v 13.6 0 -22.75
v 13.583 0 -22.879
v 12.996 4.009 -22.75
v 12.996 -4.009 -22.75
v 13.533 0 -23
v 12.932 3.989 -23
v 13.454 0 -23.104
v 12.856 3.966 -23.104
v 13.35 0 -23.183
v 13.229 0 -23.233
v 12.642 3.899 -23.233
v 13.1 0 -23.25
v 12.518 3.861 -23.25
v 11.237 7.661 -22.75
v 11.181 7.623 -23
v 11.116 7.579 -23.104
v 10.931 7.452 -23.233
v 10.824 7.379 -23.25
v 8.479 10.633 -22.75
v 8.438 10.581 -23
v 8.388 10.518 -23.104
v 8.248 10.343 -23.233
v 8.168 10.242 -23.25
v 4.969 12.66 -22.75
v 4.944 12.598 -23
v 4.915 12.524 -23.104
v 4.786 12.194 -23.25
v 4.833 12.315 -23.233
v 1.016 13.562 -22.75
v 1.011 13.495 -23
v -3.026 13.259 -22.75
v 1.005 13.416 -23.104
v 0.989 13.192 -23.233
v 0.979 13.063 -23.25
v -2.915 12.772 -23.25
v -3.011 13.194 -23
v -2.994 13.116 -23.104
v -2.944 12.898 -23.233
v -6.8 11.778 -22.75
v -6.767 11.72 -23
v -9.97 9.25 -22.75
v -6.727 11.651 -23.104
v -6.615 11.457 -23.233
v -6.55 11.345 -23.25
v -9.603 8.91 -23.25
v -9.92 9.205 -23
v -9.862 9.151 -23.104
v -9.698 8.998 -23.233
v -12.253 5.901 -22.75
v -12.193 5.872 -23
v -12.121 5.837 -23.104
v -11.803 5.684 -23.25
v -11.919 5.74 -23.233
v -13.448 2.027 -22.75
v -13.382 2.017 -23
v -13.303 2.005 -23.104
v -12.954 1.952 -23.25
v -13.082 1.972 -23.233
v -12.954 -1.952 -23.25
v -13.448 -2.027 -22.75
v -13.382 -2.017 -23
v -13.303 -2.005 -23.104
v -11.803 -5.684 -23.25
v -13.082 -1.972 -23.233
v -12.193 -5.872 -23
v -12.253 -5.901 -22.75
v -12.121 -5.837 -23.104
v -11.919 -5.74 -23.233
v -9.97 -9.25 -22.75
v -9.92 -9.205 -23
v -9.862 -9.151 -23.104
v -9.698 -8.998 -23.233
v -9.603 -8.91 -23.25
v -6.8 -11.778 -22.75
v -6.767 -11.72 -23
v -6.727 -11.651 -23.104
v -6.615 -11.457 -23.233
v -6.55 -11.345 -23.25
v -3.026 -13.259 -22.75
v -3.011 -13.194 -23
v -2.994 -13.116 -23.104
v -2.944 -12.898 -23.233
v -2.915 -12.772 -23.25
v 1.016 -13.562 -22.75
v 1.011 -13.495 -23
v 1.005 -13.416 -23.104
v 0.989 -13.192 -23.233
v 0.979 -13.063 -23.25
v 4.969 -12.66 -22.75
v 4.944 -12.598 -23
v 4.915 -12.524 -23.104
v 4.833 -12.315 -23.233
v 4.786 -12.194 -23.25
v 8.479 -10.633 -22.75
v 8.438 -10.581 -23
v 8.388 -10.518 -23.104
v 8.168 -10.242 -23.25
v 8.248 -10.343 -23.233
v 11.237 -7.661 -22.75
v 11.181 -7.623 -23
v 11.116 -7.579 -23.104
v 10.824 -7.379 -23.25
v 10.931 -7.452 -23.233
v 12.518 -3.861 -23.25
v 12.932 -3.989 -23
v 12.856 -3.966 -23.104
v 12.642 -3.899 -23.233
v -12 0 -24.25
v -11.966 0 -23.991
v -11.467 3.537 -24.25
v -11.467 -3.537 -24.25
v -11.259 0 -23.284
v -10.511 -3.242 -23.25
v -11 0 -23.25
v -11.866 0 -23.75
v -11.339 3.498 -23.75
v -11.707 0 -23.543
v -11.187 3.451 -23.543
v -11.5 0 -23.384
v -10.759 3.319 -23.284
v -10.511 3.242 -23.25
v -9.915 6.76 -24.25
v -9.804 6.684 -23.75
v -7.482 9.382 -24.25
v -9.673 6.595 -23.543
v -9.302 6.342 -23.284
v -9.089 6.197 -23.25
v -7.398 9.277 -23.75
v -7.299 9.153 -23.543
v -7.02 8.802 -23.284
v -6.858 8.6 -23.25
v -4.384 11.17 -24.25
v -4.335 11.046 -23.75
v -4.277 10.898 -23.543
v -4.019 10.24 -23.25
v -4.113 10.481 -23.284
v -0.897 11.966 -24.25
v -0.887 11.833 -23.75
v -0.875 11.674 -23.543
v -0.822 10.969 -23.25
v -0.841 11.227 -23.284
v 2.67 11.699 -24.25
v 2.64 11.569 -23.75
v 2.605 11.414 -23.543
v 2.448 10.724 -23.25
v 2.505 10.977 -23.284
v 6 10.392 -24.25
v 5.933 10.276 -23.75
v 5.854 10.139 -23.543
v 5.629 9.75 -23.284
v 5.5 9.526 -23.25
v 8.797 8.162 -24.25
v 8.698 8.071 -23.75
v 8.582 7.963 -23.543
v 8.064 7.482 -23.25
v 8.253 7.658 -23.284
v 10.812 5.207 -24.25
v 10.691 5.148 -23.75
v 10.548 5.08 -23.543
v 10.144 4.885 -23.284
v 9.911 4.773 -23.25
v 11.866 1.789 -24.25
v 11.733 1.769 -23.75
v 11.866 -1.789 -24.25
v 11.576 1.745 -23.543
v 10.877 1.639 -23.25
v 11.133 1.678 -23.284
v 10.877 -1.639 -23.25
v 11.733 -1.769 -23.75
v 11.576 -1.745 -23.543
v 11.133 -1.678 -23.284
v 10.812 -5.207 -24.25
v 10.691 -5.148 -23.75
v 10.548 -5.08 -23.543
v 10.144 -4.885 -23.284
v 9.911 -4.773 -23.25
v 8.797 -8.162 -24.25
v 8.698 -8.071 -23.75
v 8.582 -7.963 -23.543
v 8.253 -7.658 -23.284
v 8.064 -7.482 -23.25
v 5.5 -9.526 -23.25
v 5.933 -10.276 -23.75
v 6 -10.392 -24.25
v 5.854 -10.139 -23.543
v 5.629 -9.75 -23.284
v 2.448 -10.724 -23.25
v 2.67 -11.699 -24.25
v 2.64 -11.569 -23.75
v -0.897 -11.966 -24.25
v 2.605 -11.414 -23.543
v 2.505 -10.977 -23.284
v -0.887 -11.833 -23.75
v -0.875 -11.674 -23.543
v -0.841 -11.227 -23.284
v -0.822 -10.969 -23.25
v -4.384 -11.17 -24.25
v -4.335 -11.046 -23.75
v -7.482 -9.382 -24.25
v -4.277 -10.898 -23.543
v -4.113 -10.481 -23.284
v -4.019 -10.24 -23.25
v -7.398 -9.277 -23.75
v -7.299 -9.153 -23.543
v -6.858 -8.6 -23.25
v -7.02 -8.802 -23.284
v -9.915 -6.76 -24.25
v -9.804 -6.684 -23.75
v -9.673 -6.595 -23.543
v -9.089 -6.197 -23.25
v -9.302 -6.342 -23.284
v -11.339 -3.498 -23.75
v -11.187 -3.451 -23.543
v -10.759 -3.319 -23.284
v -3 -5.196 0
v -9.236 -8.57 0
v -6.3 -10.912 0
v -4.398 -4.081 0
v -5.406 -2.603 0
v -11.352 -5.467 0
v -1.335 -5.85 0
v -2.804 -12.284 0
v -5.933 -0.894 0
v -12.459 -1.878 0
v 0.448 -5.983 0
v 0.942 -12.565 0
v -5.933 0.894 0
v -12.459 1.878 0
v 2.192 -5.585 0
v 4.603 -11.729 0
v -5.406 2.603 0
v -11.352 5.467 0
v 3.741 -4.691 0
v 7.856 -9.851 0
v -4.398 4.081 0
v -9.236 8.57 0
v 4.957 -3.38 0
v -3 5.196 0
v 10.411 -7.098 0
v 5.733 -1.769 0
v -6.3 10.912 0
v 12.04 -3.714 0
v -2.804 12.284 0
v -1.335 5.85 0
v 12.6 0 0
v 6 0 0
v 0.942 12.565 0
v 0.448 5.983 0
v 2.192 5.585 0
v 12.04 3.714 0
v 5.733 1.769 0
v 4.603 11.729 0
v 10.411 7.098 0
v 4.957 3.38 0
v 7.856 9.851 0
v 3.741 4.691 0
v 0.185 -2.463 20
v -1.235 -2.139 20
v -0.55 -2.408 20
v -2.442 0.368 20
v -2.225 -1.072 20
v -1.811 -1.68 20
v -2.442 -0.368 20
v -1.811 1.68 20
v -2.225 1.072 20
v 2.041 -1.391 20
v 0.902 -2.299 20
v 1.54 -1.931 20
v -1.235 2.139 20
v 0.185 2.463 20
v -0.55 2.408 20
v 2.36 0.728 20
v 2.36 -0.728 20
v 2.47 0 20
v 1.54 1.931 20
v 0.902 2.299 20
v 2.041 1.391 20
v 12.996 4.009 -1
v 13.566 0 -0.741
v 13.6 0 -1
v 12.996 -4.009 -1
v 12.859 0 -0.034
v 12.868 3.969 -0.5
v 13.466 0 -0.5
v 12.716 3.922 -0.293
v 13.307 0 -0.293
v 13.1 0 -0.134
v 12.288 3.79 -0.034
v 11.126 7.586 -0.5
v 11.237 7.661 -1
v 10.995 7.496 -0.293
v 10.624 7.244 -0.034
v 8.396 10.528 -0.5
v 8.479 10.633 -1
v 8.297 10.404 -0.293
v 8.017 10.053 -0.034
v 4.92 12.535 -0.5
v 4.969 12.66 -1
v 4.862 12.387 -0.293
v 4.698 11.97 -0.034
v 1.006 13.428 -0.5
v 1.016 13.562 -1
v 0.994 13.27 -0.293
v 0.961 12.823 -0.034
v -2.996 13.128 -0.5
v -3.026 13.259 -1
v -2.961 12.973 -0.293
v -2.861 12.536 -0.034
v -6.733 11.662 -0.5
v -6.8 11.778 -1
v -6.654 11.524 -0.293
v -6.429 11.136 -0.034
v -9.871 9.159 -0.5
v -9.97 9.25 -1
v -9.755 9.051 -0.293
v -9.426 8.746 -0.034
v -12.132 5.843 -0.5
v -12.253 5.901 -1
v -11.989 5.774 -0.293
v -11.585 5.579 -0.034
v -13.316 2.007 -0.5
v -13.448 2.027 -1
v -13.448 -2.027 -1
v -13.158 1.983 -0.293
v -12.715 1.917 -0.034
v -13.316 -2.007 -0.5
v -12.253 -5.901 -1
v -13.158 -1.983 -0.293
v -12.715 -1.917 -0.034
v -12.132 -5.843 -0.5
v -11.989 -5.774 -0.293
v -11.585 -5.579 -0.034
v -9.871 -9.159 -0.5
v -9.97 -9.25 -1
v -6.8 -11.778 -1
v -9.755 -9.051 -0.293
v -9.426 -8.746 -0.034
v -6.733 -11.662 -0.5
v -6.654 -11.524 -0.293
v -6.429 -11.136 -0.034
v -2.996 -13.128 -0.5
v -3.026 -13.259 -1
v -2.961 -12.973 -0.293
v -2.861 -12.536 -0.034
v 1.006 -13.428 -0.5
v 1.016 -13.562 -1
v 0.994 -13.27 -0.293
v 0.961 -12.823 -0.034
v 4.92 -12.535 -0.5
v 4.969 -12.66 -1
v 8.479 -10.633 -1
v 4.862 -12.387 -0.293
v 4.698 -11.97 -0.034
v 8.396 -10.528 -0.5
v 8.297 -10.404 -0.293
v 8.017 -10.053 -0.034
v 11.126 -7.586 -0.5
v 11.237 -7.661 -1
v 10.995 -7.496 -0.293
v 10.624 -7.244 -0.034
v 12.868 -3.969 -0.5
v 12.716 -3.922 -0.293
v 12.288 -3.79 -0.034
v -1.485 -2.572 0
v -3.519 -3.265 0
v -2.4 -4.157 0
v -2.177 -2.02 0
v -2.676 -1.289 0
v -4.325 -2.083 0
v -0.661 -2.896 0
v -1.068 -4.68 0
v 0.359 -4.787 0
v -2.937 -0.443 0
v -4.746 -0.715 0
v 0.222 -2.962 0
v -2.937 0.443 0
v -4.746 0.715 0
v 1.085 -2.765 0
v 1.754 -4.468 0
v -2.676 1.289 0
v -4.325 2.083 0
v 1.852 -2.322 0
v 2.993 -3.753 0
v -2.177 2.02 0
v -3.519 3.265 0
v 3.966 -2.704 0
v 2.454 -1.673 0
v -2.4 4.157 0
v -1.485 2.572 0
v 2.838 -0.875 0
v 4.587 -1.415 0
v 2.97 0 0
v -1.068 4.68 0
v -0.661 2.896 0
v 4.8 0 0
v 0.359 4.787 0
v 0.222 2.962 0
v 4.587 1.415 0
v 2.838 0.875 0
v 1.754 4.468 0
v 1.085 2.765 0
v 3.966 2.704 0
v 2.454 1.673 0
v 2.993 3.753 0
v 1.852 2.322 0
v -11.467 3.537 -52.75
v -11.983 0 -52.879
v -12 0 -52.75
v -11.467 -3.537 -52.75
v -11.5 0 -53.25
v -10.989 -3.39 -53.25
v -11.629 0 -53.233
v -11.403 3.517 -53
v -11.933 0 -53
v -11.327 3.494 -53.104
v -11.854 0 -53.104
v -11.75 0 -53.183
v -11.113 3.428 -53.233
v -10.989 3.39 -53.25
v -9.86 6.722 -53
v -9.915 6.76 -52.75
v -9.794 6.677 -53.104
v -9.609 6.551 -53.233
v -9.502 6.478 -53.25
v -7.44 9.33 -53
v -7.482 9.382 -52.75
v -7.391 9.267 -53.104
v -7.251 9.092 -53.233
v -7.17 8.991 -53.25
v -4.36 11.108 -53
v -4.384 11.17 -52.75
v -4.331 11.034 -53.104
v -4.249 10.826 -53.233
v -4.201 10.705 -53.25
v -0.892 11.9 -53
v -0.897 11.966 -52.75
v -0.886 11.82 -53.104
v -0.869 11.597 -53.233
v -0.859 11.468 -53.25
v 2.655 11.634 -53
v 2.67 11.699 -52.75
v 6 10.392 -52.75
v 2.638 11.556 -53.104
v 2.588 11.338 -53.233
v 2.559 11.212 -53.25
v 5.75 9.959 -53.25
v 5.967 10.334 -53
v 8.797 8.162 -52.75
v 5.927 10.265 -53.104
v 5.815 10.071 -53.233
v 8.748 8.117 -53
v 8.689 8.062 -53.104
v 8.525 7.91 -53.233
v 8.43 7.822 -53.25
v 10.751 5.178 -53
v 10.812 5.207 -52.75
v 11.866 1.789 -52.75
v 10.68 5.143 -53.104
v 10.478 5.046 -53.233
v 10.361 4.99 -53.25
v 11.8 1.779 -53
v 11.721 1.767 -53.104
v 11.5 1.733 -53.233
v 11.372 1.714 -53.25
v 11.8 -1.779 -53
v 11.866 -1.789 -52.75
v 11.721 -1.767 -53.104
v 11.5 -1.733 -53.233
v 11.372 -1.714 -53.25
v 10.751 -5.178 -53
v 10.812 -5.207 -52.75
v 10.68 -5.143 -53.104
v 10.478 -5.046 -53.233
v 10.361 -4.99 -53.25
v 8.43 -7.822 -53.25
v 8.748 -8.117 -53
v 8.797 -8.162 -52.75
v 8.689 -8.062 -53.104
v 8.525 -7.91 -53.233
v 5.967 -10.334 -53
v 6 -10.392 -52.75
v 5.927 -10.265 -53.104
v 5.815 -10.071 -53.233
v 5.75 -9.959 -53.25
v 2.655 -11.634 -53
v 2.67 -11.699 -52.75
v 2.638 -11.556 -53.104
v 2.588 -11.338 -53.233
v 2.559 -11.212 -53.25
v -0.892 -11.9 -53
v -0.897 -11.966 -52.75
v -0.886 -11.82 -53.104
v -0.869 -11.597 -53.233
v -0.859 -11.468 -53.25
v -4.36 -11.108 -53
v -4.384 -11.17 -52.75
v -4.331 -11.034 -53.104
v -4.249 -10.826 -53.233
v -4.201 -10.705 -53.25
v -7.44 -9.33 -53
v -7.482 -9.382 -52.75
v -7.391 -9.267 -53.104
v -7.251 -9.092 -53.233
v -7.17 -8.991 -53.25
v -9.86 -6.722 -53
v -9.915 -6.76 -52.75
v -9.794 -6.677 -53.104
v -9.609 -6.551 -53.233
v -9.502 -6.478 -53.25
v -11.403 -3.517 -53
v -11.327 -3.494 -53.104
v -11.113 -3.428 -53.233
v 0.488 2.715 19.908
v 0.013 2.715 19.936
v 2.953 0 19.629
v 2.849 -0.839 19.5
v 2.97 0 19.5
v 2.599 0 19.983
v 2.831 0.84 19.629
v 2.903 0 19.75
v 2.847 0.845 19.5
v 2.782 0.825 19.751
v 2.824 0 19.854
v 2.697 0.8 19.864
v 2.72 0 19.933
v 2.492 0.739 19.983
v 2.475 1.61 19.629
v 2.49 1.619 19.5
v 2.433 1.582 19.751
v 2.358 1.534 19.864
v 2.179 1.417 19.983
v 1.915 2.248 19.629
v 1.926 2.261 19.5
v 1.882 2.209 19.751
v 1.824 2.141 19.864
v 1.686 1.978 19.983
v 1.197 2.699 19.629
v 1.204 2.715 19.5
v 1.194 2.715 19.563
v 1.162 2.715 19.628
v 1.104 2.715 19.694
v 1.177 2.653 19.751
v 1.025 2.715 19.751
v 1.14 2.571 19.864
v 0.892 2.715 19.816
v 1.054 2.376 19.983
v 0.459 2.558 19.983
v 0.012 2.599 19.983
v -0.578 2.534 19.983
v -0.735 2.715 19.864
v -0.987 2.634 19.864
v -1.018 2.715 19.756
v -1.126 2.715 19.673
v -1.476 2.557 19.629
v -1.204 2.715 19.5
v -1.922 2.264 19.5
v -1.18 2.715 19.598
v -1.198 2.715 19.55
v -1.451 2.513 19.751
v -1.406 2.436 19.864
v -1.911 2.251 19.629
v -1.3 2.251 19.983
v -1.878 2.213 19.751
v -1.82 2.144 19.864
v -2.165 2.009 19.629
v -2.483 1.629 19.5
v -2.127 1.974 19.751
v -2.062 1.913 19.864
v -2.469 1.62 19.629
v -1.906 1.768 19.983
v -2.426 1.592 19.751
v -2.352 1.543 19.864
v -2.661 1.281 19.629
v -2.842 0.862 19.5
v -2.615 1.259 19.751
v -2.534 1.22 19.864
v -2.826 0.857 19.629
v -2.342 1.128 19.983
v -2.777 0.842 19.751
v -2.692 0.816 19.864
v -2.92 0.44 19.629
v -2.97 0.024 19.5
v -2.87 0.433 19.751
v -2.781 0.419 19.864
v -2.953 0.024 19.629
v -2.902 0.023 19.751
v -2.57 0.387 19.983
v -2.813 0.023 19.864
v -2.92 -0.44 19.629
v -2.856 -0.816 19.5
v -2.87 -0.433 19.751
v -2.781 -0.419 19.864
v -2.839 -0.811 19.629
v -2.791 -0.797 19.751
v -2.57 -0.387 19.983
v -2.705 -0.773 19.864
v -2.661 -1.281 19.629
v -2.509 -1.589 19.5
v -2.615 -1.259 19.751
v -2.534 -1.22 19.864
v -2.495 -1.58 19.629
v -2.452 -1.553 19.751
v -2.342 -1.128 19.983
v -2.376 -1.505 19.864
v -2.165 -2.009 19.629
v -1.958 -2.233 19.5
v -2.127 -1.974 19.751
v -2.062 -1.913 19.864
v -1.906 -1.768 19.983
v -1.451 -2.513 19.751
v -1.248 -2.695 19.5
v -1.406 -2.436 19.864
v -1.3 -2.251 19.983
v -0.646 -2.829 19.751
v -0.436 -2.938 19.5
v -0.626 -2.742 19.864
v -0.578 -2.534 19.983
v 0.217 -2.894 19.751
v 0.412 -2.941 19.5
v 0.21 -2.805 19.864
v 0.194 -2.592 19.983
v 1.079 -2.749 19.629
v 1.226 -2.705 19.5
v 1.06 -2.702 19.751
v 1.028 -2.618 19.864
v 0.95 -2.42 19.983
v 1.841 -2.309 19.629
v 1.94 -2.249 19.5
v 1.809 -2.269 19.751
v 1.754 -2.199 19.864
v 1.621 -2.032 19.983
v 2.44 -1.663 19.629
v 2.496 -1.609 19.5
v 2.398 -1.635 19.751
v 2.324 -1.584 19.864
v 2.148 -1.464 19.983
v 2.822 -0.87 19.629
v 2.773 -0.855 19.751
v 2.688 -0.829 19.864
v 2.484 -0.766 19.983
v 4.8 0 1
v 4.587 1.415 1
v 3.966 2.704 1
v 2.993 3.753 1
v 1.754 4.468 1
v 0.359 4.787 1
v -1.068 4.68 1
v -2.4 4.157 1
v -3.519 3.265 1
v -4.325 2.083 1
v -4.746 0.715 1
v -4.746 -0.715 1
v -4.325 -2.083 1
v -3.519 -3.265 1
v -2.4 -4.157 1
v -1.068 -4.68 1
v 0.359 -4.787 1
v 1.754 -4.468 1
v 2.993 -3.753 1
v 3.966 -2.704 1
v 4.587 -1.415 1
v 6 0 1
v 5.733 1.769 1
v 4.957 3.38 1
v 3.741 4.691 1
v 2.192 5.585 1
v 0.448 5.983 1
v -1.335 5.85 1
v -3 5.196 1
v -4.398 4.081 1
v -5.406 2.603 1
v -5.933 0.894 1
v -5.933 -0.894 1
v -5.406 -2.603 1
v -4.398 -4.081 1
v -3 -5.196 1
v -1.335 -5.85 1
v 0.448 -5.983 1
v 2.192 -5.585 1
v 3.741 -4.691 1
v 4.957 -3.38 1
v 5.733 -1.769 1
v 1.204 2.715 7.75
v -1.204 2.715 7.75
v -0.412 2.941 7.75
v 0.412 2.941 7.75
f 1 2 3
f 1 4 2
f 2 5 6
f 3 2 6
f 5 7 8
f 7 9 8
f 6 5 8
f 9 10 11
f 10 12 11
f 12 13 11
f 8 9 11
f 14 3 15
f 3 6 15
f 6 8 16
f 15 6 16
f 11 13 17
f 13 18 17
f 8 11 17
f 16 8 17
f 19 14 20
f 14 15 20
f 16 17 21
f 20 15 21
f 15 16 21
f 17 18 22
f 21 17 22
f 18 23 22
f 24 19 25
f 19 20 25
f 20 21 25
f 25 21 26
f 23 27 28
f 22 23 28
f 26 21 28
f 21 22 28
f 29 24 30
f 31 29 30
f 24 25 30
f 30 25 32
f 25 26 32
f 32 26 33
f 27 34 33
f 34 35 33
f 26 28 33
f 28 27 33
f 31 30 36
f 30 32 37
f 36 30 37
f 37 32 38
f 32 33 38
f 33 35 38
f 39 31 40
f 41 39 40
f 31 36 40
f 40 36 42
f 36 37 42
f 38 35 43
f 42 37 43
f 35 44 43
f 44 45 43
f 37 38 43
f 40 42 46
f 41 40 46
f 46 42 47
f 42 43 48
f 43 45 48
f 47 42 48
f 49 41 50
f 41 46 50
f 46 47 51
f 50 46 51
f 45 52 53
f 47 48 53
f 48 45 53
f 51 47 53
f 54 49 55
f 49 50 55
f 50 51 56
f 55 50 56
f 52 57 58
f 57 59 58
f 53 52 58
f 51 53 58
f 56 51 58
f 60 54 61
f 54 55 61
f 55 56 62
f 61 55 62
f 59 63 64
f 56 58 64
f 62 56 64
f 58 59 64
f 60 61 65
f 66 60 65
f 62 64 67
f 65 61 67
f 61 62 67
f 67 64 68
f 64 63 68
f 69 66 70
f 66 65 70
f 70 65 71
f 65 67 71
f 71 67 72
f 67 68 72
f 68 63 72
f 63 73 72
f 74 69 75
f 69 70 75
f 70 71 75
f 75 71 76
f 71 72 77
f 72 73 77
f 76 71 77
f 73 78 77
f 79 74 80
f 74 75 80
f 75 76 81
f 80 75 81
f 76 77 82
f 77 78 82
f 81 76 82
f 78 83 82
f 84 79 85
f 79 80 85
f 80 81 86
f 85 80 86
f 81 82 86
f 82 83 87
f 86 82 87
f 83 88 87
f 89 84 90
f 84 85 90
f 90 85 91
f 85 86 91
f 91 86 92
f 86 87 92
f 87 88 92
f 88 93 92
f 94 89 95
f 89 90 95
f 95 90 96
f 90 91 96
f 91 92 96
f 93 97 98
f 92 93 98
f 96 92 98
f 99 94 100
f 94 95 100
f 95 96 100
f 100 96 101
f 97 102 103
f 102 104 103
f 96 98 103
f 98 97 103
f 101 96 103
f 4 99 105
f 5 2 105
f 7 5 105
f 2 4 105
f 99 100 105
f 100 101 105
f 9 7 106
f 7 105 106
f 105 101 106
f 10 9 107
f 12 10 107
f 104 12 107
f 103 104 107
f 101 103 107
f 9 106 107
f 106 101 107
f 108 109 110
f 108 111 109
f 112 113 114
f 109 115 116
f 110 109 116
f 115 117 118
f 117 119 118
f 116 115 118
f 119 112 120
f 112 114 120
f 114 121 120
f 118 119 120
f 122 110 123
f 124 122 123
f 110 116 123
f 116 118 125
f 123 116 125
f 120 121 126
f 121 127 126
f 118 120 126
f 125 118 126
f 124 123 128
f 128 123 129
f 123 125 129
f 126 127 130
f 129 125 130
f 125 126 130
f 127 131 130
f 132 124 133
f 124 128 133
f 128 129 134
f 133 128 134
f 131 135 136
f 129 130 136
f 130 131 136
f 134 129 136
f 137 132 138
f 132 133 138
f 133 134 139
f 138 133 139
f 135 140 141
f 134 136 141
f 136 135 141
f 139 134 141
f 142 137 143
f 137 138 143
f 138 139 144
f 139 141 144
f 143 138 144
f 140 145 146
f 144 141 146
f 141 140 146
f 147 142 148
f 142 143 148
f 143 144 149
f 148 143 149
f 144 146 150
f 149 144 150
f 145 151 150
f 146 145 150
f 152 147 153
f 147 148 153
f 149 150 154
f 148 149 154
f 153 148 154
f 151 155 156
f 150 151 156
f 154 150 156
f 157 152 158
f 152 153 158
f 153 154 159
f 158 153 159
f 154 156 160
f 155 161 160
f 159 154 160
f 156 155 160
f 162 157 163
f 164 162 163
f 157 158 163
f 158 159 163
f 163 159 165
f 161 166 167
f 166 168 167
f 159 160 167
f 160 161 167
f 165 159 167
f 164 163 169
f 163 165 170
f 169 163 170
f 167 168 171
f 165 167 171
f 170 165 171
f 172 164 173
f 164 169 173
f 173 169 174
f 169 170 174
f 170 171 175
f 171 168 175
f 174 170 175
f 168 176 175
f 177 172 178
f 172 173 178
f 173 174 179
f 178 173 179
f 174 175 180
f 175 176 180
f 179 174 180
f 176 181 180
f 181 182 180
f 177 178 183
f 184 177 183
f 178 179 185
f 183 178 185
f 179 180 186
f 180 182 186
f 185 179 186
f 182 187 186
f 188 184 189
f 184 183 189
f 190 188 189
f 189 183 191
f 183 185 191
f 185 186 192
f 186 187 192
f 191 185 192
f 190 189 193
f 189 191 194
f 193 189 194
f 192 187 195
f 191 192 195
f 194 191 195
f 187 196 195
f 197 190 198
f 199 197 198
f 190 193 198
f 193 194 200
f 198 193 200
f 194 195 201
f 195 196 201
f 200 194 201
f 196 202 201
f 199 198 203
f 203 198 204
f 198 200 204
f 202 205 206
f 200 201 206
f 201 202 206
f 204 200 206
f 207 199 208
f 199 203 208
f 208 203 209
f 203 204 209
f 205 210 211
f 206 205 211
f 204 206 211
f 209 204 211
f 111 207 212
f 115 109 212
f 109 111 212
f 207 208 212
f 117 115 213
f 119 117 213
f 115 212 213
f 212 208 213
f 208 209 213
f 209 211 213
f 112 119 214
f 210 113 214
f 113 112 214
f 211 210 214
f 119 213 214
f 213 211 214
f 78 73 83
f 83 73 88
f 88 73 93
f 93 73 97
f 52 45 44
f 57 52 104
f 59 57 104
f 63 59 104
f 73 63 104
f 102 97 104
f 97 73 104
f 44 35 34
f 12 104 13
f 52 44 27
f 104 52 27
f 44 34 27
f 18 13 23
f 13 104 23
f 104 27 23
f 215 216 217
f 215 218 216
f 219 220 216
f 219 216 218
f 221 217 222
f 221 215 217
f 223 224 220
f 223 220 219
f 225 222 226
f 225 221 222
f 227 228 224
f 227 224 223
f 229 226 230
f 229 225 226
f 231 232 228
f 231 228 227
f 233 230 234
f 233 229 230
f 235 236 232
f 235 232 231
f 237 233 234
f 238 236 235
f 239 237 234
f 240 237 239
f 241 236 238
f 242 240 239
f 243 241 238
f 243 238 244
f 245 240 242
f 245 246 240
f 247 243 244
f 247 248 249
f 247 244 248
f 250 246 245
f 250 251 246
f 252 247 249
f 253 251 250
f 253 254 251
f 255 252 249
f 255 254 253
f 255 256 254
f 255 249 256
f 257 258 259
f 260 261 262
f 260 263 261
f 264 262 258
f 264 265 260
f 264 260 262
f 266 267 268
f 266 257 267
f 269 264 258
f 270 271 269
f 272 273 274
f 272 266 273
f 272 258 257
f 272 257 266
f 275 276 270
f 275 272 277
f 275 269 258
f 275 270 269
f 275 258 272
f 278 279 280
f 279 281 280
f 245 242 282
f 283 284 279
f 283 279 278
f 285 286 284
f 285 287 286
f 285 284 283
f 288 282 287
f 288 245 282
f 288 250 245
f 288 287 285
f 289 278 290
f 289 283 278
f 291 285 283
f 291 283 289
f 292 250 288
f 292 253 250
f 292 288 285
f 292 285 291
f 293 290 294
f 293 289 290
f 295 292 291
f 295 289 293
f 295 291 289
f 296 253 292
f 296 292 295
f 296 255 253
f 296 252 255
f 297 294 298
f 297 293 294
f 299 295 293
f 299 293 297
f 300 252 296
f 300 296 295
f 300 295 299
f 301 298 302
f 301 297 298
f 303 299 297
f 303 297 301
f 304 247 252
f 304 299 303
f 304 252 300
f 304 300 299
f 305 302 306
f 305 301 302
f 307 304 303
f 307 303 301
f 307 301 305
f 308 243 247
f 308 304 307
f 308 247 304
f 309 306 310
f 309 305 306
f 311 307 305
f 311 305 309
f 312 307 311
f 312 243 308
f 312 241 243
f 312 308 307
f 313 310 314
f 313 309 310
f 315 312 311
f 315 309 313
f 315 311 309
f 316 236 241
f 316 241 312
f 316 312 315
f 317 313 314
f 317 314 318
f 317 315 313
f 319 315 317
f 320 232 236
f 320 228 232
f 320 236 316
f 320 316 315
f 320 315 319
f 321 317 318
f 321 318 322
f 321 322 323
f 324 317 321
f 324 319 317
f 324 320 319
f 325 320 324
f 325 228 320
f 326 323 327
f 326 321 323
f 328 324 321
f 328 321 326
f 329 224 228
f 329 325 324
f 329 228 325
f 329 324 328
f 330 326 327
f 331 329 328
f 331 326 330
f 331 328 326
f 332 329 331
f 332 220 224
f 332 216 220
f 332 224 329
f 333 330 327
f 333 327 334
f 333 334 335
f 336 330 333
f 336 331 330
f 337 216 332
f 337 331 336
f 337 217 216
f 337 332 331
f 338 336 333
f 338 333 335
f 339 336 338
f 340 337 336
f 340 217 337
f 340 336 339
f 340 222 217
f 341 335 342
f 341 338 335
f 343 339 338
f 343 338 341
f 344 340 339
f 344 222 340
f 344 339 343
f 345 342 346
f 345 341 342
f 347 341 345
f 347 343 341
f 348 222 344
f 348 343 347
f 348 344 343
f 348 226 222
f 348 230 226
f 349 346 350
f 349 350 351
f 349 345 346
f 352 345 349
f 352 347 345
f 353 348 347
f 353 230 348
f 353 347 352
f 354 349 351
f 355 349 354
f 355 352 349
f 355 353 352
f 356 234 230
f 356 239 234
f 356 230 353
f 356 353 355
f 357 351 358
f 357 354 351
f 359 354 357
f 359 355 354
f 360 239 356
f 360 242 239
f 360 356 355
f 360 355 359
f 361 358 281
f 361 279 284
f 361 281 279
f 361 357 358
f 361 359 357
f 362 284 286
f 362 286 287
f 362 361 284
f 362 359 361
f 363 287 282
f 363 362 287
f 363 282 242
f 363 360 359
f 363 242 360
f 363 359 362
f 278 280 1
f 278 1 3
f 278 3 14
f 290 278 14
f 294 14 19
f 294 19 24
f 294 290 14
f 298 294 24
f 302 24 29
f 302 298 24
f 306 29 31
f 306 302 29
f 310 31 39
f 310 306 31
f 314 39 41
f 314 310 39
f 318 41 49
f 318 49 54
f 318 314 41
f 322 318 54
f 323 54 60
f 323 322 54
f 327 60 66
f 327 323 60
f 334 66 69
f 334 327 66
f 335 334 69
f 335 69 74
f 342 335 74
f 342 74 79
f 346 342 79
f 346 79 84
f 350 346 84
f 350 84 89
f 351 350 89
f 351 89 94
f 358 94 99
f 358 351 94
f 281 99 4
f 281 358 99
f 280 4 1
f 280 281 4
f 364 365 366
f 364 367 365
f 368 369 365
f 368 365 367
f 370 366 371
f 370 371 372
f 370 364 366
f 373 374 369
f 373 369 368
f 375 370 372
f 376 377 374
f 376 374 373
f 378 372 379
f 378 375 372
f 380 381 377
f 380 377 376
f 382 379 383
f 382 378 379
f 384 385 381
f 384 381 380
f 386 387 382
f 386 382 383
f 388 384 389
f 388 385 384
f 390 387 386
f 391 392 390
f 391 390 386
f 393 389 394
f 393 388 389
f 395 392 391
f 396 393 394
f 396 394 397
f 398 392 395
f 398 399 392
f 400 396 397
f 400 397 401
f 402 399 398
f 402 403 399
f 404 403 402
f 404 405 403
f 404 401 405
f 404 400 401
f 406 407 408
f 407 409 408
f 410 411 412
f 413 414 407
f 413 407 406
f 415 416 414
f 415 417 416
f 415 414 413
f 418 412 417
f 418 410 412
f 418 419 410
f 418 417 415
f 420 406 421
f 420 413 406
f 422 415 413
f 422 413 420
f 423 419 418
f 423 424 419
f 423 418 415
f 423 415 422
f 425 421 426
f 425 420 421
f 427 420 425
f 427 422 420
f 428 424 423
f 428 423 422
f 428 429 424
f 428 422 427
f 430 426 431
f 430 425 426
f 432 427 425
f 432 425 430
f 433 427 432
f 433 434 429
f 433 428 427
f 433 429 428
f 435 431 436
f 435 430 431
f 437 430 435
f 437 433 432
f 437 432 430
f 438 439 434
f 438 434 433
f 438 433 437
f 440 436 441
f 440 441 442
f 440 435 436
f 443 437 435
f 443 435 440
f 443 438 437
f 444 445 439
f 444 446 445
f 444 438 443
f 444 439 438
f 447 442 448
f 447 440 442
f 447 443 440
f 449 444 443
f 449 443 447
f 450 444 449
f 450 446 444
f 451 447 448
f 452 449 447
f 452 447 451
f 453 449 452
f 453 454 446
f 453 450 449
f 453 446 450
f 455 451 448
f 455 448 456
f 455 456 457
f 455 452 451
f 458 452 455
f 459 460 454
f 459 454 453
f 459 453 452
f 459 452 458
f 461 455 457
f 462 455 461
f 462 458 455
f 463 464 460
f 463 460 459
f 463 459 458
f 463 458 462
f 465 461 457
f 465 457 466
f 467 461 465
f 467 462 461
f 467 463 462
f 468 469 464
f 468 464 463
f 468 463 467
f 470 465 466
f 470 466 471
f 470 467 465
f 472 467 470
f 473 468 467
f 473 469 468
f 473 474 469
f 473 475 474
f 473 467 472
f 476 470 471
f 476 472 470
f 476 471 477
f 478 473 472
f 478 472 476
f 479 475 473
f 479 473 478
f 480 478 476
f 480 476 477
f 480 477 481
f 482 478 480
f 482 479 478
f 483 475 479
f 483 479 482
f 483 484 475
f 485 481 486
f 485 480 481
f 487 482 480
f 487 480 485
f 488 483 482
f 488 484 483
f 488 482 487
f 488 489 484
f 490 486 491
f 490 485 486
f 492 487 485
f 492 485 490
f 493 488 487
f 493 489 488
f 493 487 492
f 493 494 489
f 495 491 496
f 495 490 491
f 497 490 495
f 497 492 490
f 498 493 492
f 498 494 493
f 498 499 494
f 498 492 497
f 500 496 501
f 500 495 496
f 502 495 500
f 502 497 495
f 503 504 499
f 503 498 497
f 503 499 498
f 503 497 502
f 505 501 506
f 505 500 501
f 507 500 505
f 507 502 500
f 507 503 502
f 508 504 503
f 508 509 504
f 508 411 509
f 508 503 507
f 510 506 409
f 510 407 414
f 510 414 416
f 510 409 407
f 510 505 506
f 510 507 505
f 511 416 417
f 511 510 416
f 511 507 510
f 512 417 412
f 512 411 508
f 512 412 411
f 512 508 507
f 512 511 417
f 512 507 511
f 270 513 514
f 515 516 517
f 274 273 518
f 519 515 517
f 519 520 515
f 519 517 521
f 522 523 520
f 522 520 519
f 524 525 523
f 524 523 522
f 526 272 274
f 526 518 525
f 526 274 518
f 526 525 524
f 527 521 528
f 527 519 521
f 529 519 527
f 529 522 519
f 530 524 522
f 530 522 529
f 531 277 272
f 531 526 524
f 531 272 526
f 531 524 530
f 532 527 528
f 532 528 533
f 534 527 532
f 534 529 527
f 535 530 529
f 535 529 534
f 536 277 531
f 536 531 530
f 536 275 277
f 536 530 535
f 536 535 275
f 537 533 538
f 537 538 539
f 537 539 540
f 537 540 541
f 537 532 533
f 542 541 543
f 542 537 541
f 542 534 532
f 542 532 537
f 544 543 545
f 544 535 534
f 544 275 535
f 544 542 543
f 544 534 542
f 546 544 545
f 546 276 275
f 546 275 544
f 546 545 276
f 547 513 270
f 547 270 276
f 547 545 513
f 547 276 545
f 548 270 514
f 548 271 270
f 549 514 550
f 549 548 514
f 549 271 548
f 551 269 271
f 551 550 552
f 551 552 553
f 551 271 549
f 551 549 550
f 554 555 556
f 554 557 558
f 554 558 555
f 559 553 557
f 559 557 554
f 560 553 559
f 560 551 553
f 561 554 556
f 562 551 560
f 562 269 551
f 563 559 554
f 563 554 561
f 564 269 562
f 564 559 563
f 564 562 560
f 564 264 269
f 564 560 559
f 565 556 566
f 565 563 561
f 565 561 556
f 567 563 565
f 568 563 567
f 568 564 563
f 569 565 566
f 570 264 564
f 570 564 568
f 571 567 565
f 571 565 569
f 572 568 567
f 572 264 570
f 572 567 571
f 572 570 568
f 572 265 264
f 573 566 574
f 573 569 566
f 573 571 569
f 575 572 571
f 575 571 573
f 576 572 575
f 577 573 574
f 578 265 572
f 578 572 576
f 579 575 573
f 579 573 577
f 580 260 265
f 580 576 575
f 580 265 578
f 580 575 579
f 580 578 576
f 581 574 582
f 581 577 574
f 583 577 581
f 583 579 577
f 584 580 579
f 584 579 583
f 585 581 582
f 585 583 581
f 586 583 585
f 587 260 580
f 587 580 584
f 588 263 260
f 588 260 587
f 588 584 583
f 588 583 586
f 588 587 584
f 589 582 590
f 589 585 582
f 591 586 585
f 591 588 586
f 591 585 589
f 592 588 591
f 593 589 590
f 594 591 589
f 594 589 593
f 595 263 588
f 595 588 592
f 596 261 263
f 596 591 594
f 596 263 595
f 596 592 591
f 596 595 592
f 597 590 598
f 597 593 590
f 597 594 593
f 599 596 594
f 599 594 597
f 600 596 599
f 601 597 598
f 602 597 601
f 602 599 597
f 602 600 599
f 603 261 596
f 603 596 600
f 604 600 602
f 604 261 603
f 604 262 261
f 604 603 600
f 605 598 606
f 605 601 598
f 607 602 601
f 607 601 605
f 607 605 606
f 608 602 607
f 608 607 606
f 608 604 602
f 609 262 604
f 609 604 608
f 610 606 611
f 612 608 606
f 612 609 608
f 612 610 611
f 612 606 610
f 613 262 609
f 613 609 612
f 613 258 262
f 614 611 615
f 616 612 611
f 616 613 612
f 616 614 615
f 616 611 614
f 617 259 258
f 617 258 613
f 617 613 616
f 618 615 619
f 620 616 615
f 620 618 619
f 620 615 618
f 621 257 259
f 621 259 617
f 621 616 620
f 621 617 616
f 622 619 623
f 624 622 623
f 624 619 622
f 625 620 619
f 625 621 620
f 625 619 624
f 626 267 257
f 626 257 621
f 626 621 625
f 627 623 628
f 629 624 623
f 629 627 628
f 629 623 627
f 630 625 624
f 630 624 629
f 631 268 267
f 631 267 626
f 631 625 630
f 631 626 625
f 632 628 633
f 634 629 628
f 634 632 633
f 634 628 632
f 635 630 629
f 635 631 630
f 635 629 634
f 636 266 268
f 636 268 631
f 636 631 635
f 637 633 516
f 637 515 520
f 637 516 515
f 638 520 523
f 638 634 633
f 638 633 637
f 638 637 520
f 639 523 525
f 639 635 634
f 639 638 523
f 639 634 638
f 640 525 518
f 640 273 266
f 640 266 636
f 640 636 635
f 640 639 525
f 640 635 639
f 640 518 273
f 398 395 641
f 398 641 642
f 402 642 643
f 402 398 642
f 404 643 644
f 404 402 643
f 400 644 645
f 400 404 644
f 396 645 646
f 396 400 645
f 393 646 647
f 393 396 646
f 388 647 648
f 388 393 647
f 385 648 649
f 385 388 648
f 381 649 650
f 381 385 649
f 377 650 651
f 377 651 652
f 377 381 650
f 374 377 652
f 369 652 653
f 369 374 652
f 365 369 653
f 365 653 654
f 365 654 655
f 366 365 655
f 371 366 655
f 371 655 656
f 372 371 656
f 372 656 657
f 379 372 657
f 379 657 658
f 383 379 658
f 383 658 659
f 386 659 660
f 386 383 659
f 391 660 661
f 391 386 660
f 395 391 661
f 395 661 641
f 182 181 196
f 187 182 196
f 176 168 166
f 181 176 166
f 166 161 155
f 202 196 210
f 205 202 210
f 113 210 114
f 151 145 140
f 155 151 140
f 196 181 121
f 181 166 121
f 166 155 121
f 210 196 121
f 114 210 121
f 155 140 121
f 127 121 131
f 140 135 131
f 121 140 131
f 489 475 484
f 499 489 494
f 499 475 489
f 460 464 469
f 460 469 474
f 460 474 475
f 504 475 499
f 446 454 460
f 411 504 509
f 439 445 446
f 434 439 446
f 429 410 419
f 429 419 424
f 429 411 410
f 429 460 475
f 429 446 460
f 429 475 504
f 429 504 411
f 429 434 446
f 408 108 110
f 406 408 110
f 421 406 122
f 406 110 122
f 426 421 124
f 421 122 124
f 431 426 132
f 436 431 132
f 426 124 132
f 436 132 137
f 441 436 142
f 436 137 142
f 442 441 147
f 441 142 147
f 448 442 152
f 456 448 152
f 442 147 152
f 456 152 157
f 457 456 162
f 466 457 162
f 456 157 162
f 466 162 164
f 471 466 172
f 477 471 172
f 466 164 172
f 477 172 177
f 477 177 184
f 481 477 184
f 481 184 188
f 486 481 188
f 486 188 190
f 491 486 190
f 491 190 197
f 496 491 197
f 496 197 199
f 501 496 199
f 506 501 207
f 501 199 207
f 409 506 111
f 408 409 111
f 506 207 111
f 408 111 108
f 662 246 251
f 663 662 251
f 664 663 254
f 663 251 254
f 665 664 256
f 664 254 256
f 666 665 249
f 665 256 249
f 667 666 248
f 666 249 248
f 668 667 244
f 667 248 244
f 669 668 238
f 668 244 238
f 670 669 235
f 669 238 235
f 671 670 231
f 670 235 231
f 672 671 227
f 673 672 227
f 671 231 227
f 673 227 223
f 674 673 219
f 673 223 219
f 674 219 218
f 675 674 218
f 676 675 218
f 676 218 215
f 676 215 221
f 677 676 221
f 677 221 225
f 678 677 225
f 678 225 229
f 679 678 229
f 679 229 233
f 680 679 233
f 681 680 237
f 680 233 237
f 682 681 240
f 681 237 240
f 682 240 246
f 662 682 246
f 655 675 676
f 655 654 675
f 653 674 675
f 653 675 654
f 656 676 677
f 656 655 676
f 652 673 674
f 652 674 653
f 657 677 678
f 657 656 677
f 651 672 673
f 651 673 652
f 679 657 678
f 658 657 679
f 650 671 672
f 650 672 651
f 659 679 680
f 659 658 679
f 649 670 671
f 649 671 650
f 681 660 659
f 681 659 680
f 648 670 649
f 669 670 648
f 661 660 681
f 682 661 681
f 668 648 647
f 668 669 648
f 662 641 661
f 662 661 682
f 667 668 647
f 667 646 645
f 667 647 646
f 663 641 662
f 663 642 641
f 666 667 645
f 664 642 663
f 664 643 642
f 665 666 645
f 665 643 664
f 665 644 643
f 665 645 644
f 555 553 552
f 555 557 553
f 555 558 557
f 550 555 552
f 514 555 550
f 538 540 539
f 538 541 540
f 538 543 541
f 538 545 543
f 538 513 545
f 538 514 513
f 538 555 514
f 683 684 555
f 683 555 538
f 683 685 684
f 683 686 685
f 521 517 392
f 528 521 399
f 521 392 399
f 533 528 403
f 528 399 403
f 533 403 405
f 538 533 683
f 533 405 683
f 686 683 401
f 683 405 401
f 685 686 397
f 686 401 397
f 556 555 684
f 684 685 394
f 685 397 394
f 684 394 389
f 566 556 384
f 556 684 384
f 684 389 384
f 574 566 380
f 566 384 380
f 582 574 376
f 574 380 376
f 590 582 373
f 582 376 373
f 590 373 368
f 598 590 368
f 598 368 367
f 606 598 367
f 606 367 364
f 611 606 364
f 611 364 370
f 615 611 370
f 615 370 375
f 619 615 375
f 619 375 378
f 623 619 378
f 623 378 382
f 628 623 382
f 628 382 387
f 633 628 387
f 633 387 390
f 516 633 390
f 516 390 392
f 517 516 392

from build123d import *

# Parameters (mm, degrees)
SKETCH1_R               = 13.6
BOSS_EXTRUDE1_DEPTH     = 23.25
SKETCH2_R               = 12
BOSS_EXTRUDE2_DEPTH     = 30
FILLET1_R               = 1
FILLET2_R               = 1
SKETCH3_R               = 6
SKETCH3_R_2             = 4.8
BOSS_EXTRUDE3_DEPTH     = 1
SKETCH4_R               = 2.97
BOSS_EXTRUDE4_DEPTH     = 20
CUT_EXTRUDE1_DEPTH      = 76.7329684
CUT_EXTRUDE1_DEPTH_BACK = 12.25
FILLET3_R               = 0.5
FILLET4_R               = 0.5
FILLET5_R               = 0.5


with BuildPart() as part:
    # Sketch1 → Boss-Extrude1 (new body)
    with BuildSketch(Plane.XY):
        Circle(SKETCH1_R)
    extrude(amount=-BOSS_EXTRUDE1_DEPTH)

    # Fillet2
    fillet2_edges = [part.edges().sort_by_distance(p)[0] for p in [
        (-13.6, 0, 0),
    ]]
    fillet(fillet2_edges, radius=FILLET2_R)

    # Sketch3 → Boss-Extrude3 (add)
    with BuildSketch(Plane.XY):
        Circle(SKETCH3_R)
        Circle(SKETCH3_R_2, mode=Mode.SUBTRACT)
    extrude(amount=BOSS_EXTRUDE3_DEPTH)

    # Sketch4 → Boss-Extrude4 (add)
    with BuildSketch(Plane.XY):
        Circle(SKETCH4_R)
    extrude(amount=BOSS_EXTRUDE4_DEPTH)

    # Sketch5 → Cut-Extrude1 (cut, two sides: drawn at the far end of the back side and taken through both)
    with BuildSketch(Plane.XY.offset(20).offset(-CUT_EXTRUDE1_DEPTH_BACK)):
        Polygon((-55.264817477, 2.715), (-1.204024501, 2.715), (1.204024501, 2.715), (55.264817477, 2.715), (55.264817477, 110.83658595), (-55.264817477, 110.83658595), align=None)
    extrude(amount=CUT_EXTRUDE1_DEPTH + CUT_EXTRUDE1_DEPTH_BACK, mode=Mode.SUBTRACT)

    # Fillet3
    # the kernel refuses this fillet: 0.5 mm, written as the material it takes off along each edge
    with BuildSketch(Plane(origin=(0, 0, 20), x_dir=(0.004730320040790282, 0.9999888119735698, 0), z_dir=(0.9999888119735698, -0.004730320040790282, 0))) as fillet3_piece_1:
        with BuildLine():
            CenterArc((2.97 - FILLET3_R, -FILLET3_R), FILLET3_R, 0, 90)
            Line((2.97 - FILLET3_R, 0), (2.97, 0))
            Line((2.97, 0), (2.97, -FILLET3_R))
        make_face()
    revolve(axis=Axis((0, 0, 20), (0, 0, 1)), revolution_arc=270.271028385, mode=Mode.SUBTRACT)
    with BuildSketch(Plane(origin=(0, 0, 20), x_dir=(1, 0, 0), z_dir=(0, -1, 0))) as fillet3_piece_2:
        with BuildLine():
            CenterArc((2.97 - FILLET3_R, -FILLET3_R), FILLET3_R, 0, 90)
            Line((2.97 - FILLET3_R, 0), (2.97, 0))
            Line((2.97, 0), (2.97, -FILLET3_R))
        make_face()
    revolve(axis=Axis((0, 0, 20), (0, 0, 1)), revolution_arc=90.203696588, mode=Mode.SUBTRACT)

    # Fillet4
    fillet4_edges = [part.edges().sort_by_distance(p)[0] for p in [
        (-13.6, 0, -23.25),
    ]]
    fillet(fillet4_edges, radius=FILLET4_R)


with BuildPart() as body_2:
    # Sketch2 → Boss-Extrude2 (new body)
    with BuildSketch(Plane(origin=(0, 0, -23.25), x_dir=(-1, 0, 0), z_dir=(0, 0, -1))):
        Circle(SKETCH2_R)
    extrude(amount=BOSS_EXTRUDE2_DEPTH)

    # Fillet1
    fillet1_edges = [body_2.edges().sort_by_distance(p)[0] for p in [
        (12, 0, -23.25),
    ]]
    fillet(fillet1_edges, radius=FILLET1_R)

    # Fillet5
    fillet5_edges = [body_2.edges().sort_by_distance(p)[0] for p in [
        (12, 0, -53.25),
    ]]
    fillet(fillet5_edges, radius=FILLET5_R)


solid = Compound([part.part, body_2.part])
